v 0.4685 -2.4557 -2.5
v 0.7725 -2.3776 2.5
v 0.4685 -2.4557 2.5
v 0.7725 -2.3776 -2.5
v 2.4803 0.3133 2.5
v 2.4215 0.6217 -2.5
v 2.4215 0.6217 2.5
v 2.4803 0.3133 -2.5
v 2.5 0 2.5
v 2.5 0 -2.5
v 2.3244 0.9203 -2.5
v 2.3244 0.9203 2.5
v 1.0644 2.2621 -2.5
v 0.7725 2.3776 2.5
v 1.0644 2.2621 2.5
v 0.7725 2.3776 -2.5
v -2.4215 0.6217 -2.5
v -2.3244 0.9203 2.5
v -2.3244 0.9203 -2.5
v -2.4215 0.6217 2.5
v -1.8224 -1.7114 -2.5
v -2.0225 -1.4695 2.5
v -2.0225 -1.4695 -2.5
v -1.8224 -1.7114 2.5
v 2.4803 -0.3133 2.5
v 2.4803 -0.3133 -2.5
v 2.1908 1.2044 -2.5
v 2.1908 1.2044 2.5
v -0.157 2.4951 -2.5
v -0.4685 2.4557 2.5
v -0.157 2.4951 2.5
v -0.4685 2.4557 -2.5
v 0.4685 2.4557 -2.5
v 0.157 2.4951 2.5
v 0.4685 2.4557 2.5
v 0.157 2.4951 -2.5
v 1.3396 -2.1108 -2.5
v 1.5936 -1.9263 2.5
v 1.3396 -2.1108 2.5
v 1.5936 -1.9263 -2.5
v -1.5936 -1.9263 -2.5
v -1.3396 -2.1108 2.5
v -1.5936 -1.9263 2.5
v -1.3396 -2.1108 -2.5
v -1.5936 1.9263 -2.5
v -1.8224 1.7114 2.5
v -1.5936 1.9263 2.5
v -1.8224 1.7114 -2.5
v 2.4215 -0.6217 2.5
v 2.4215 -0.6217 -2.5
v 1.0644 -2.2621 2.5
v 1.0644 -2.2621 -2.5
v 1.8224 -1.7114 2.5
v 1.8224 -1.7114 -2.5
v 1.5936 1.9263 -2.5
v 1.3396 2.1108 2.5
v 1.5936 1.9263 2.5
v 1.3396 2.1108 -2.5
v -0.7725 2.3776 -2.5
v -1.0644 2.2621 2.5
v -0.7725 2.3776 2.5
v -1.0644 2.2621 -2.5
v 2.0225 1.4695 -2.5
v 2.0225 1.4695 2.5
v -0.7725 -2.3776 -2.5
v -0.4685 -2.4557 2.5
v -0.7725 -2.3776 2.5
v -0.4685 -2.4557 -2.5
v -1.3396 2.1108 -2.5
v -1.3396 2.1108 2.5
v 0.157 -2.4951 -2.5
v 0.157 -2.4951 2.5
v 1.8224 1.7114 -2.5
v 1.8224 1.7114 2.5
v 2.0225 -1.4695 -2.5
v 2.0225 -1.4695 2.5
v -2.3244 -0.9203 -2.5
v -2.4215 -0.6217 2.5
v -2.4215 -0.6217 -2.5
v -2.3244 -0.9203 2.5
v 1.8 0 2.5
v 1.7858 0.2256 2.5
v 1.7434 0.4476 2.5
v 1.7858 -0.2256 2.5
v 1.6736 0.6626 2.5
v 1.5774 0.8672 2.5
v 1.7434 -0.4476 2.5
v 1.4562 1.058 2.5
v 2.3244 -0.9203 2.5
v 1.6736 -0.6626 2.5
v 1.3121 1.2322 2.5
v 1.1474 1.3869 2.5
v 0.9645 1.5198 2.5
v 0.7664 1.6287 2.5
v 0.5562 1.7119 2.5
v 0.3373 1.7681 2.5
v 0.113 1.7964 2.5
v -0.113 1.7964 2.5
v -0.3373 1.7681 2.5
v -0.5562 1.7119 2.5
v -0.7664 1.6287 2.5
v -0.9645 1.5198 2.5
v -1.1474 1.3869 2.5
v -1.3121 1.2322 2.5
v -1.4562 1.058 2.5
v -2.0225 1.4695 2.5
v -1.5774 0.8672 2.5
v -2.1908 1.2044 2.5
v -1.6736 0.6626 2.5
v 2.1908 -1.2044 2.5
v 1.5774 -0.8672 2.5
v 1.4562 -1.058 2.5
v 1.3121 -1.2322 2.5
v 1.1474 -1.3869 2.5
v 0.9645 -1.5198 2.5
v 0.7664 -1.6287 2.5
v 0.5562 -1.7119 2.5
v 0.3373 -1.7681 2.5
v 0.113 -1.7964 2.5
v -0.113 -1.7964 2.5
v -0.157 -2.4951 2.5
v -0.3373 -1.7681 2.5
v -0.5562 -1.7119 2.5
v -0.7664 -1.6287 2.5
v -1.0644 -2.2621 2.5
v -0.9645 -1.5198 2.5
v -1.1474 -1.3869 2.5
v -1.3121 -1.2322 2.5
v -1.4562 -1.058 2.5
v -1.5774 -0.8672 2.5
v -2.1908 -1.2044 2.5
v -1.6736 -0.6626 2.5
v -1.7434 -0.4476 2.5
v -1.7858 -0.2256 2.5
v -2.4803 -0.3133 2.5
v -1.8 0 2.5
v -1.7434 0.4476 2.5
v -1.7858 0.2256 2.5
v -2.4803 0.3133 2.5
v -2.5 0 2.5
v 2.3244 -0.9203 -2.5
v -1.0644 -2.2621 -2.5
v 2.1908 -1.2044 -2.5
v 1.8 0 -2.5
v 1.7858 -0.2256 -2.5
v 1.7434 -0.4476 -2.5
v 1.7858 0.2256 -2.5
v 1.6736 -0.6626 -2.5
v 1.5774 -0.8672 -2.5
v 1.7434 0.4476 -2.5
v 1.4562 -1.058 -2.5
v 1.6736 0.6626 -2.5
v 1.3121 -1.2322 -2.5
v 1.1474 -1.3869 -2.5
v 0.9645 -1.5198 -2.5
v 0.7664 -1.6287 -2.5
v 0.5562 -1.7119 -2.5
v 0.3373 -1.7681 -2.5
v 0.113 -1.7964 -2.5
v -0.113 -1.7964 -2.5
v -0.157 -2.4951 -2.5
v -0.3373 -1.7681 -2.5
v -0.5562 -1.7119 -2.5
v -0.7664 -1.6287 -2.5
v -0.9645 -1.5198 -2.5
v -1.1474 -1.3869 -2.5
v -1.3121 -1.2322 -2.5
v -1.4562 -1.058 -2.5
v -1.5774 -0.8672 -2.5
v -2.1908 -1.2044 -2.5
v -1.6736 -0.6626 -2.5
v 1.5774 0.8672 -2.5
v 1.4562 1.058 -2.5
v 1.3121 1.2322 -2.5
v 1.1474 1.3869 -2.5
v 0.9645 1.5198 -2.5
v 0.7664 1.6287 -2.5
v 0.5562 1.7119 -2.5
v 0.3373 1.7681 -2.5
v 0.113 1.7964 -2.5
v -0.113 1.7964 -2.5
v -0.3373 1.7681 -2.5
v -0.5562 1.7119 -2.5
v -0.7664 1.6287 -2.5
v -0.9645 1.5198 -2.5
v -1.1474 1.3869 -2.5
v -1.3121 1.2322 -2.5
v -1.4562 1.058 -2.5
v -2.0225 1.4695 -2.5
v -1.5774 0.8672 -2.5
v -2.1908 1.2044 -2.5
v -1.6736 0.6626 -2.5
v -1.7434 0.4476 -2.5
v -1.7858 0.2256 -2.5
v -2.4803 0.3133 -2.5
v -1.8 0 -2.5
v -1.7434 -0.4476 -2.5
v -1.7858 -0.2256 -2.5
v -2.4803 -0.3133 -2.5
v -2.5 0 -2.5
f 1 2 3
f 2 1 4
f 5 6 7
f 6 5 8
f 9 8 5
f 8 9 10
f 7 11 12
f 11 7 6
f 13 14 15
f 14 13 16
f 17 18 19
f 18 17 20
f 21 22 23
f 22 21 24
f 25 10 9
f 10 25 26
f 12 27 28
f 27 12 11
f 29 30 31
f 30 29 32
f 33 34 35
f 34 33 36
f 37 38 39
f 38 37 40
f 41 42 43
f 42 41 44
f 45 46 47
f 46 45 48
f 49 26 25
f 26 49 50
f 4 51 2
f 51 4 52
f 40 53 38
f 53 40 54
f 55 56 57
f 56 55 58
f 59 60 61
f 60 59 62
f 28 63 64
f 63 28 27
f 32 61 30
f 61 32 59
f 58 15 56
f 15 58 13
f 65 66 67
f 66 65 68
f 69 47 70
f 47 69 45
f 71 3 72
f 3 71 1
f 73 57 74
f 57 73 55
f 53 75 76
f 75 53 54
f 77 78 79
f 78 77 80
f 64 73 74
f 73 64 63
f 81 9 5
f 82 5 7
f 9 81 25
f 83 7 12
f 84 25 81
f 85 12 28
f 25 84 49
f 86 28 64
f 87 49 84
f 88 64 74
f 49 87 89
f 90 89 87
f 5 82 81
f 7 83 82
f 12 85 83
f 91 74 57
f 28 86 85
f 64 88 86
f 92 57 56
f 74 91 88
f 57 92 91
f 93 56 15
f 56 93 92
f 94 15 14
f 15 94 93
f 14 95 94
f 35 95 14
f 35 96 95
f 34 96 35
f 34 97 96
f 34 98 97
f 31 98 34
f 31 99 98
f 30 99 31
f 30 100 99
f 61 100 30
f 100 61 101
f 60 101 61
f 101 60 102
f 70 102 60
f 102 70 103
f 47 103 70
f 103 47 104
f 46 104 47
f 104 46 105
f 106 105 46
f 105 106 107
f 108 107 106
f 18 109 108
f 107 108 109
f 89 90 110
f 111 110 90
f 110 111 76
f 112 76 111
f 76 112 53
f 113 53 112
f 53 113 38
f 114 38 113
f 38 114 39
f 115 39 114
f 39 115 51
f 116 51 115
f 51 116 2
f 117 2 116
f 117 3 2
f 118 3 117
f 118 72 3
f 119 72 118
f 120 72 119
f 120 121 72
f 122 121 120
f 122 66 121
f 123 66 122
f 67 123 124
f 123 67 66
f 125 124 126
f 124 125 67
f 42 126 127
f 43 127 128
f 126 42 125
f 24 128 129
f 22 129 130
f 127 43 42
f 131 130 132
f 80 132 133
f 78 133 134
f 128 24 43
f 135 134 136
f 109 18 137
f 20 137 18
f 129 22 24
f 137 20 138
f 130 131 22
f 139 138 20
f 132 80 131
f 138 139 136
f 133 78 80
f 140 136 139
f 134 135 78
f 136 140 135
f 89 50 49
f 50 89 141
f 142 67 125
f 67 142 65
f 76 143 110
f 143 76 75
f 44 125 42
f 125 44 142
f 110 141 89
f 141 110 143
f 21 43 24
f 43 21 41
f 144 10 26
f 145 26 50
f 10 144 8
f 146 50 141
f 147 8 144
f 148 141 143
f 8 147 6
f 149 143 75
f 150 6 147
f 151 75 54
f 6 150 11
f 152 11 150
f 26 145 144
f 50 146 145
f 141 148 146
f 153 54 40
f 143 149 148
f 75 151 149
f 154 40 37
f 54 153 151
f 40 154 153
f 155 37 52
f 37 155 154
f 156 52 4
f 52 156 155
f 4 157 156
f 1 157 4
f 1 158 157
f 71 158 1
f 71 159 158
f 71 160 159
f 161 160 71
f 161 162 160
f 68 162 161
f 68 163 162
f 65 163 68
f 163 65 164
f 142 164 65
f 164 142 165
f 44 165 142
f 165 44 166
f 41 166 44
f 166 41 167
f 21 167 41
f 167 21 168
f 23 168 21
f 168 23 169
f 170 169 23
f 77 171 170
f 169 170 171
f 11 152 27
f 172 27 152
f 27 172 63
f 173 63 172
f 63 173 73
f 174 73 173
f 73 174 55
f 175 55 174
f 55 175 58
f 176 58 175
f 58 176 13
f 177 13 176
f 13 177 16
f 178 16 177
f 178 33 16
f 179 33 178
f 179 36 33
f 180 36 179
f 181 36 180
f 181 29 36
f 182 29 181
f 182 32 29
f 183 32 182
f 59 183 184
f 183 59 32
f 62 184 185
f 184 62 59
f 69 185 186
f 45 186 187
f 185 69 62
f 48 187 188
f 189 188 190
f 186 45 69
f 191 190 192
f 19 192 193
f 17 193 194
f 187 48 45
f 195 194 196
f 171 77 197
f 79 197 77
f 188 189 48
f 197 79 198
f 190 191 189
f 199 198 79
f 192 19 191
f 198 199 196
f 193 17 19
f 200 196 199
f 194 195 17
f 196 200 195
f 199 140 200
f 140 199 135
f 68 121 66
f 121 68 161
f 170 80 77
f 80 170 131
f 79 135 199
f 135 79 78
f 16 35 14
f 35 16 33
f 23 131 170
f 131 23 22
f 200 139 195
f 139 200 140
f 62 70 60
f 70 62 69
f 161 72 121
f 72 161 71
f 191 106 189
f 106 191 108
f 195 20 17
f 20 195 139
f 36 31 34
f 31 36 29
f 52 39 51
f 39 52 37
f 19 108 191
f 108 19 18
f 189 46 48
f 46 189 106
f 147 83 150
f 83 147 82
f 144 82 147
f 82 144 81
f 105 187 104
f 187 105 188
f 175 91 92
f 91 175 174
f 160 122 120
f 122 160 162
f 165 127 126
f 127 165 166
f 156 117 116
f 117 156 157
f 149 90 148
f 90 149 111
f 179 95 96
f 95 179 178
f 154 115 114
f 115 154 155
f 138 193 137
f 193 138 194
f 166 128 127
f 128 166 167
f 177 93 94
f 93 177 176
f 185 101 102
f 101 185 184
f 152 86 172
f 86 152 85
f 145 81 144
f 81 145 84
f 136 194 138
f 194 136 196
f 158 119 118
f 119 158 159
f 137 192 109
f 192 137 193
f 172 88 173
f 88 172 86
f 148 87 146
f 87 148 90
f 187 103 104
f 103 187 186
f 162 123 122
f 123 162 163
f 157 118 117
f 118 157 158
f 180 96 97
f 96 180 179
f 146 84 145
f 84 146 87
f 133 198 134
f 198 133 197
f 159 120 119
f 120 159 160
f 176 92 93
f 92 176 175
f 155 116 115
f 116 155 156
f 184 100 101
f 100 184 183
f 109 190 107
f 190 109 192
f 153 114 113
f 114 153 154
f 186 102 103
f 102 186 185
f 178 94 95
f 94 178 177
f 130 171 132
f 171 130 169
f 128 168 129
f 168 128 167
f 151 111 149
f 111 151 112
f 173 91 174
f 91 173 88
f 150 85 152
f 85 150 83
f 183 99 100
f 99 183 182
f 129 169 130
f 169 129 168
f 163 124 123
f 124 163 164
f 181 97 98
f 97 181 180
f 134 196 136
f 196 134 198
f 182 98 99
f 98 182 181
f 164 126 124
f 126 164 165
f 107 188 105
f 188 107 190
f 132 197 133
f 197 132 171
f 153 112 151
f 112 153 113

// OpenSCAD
$fn = 50;


difference() {
	union() {
		translate(v = [0, 0, -2.5000000000]) {
			cylinder(h = 5, r = 2.5000000000);
		}
	}
	union() {
		#translate(v = [0, 0, -100.0000000000]) {
			cylinder(h = 200, r = 1.8000000000);
		}
	}
}
